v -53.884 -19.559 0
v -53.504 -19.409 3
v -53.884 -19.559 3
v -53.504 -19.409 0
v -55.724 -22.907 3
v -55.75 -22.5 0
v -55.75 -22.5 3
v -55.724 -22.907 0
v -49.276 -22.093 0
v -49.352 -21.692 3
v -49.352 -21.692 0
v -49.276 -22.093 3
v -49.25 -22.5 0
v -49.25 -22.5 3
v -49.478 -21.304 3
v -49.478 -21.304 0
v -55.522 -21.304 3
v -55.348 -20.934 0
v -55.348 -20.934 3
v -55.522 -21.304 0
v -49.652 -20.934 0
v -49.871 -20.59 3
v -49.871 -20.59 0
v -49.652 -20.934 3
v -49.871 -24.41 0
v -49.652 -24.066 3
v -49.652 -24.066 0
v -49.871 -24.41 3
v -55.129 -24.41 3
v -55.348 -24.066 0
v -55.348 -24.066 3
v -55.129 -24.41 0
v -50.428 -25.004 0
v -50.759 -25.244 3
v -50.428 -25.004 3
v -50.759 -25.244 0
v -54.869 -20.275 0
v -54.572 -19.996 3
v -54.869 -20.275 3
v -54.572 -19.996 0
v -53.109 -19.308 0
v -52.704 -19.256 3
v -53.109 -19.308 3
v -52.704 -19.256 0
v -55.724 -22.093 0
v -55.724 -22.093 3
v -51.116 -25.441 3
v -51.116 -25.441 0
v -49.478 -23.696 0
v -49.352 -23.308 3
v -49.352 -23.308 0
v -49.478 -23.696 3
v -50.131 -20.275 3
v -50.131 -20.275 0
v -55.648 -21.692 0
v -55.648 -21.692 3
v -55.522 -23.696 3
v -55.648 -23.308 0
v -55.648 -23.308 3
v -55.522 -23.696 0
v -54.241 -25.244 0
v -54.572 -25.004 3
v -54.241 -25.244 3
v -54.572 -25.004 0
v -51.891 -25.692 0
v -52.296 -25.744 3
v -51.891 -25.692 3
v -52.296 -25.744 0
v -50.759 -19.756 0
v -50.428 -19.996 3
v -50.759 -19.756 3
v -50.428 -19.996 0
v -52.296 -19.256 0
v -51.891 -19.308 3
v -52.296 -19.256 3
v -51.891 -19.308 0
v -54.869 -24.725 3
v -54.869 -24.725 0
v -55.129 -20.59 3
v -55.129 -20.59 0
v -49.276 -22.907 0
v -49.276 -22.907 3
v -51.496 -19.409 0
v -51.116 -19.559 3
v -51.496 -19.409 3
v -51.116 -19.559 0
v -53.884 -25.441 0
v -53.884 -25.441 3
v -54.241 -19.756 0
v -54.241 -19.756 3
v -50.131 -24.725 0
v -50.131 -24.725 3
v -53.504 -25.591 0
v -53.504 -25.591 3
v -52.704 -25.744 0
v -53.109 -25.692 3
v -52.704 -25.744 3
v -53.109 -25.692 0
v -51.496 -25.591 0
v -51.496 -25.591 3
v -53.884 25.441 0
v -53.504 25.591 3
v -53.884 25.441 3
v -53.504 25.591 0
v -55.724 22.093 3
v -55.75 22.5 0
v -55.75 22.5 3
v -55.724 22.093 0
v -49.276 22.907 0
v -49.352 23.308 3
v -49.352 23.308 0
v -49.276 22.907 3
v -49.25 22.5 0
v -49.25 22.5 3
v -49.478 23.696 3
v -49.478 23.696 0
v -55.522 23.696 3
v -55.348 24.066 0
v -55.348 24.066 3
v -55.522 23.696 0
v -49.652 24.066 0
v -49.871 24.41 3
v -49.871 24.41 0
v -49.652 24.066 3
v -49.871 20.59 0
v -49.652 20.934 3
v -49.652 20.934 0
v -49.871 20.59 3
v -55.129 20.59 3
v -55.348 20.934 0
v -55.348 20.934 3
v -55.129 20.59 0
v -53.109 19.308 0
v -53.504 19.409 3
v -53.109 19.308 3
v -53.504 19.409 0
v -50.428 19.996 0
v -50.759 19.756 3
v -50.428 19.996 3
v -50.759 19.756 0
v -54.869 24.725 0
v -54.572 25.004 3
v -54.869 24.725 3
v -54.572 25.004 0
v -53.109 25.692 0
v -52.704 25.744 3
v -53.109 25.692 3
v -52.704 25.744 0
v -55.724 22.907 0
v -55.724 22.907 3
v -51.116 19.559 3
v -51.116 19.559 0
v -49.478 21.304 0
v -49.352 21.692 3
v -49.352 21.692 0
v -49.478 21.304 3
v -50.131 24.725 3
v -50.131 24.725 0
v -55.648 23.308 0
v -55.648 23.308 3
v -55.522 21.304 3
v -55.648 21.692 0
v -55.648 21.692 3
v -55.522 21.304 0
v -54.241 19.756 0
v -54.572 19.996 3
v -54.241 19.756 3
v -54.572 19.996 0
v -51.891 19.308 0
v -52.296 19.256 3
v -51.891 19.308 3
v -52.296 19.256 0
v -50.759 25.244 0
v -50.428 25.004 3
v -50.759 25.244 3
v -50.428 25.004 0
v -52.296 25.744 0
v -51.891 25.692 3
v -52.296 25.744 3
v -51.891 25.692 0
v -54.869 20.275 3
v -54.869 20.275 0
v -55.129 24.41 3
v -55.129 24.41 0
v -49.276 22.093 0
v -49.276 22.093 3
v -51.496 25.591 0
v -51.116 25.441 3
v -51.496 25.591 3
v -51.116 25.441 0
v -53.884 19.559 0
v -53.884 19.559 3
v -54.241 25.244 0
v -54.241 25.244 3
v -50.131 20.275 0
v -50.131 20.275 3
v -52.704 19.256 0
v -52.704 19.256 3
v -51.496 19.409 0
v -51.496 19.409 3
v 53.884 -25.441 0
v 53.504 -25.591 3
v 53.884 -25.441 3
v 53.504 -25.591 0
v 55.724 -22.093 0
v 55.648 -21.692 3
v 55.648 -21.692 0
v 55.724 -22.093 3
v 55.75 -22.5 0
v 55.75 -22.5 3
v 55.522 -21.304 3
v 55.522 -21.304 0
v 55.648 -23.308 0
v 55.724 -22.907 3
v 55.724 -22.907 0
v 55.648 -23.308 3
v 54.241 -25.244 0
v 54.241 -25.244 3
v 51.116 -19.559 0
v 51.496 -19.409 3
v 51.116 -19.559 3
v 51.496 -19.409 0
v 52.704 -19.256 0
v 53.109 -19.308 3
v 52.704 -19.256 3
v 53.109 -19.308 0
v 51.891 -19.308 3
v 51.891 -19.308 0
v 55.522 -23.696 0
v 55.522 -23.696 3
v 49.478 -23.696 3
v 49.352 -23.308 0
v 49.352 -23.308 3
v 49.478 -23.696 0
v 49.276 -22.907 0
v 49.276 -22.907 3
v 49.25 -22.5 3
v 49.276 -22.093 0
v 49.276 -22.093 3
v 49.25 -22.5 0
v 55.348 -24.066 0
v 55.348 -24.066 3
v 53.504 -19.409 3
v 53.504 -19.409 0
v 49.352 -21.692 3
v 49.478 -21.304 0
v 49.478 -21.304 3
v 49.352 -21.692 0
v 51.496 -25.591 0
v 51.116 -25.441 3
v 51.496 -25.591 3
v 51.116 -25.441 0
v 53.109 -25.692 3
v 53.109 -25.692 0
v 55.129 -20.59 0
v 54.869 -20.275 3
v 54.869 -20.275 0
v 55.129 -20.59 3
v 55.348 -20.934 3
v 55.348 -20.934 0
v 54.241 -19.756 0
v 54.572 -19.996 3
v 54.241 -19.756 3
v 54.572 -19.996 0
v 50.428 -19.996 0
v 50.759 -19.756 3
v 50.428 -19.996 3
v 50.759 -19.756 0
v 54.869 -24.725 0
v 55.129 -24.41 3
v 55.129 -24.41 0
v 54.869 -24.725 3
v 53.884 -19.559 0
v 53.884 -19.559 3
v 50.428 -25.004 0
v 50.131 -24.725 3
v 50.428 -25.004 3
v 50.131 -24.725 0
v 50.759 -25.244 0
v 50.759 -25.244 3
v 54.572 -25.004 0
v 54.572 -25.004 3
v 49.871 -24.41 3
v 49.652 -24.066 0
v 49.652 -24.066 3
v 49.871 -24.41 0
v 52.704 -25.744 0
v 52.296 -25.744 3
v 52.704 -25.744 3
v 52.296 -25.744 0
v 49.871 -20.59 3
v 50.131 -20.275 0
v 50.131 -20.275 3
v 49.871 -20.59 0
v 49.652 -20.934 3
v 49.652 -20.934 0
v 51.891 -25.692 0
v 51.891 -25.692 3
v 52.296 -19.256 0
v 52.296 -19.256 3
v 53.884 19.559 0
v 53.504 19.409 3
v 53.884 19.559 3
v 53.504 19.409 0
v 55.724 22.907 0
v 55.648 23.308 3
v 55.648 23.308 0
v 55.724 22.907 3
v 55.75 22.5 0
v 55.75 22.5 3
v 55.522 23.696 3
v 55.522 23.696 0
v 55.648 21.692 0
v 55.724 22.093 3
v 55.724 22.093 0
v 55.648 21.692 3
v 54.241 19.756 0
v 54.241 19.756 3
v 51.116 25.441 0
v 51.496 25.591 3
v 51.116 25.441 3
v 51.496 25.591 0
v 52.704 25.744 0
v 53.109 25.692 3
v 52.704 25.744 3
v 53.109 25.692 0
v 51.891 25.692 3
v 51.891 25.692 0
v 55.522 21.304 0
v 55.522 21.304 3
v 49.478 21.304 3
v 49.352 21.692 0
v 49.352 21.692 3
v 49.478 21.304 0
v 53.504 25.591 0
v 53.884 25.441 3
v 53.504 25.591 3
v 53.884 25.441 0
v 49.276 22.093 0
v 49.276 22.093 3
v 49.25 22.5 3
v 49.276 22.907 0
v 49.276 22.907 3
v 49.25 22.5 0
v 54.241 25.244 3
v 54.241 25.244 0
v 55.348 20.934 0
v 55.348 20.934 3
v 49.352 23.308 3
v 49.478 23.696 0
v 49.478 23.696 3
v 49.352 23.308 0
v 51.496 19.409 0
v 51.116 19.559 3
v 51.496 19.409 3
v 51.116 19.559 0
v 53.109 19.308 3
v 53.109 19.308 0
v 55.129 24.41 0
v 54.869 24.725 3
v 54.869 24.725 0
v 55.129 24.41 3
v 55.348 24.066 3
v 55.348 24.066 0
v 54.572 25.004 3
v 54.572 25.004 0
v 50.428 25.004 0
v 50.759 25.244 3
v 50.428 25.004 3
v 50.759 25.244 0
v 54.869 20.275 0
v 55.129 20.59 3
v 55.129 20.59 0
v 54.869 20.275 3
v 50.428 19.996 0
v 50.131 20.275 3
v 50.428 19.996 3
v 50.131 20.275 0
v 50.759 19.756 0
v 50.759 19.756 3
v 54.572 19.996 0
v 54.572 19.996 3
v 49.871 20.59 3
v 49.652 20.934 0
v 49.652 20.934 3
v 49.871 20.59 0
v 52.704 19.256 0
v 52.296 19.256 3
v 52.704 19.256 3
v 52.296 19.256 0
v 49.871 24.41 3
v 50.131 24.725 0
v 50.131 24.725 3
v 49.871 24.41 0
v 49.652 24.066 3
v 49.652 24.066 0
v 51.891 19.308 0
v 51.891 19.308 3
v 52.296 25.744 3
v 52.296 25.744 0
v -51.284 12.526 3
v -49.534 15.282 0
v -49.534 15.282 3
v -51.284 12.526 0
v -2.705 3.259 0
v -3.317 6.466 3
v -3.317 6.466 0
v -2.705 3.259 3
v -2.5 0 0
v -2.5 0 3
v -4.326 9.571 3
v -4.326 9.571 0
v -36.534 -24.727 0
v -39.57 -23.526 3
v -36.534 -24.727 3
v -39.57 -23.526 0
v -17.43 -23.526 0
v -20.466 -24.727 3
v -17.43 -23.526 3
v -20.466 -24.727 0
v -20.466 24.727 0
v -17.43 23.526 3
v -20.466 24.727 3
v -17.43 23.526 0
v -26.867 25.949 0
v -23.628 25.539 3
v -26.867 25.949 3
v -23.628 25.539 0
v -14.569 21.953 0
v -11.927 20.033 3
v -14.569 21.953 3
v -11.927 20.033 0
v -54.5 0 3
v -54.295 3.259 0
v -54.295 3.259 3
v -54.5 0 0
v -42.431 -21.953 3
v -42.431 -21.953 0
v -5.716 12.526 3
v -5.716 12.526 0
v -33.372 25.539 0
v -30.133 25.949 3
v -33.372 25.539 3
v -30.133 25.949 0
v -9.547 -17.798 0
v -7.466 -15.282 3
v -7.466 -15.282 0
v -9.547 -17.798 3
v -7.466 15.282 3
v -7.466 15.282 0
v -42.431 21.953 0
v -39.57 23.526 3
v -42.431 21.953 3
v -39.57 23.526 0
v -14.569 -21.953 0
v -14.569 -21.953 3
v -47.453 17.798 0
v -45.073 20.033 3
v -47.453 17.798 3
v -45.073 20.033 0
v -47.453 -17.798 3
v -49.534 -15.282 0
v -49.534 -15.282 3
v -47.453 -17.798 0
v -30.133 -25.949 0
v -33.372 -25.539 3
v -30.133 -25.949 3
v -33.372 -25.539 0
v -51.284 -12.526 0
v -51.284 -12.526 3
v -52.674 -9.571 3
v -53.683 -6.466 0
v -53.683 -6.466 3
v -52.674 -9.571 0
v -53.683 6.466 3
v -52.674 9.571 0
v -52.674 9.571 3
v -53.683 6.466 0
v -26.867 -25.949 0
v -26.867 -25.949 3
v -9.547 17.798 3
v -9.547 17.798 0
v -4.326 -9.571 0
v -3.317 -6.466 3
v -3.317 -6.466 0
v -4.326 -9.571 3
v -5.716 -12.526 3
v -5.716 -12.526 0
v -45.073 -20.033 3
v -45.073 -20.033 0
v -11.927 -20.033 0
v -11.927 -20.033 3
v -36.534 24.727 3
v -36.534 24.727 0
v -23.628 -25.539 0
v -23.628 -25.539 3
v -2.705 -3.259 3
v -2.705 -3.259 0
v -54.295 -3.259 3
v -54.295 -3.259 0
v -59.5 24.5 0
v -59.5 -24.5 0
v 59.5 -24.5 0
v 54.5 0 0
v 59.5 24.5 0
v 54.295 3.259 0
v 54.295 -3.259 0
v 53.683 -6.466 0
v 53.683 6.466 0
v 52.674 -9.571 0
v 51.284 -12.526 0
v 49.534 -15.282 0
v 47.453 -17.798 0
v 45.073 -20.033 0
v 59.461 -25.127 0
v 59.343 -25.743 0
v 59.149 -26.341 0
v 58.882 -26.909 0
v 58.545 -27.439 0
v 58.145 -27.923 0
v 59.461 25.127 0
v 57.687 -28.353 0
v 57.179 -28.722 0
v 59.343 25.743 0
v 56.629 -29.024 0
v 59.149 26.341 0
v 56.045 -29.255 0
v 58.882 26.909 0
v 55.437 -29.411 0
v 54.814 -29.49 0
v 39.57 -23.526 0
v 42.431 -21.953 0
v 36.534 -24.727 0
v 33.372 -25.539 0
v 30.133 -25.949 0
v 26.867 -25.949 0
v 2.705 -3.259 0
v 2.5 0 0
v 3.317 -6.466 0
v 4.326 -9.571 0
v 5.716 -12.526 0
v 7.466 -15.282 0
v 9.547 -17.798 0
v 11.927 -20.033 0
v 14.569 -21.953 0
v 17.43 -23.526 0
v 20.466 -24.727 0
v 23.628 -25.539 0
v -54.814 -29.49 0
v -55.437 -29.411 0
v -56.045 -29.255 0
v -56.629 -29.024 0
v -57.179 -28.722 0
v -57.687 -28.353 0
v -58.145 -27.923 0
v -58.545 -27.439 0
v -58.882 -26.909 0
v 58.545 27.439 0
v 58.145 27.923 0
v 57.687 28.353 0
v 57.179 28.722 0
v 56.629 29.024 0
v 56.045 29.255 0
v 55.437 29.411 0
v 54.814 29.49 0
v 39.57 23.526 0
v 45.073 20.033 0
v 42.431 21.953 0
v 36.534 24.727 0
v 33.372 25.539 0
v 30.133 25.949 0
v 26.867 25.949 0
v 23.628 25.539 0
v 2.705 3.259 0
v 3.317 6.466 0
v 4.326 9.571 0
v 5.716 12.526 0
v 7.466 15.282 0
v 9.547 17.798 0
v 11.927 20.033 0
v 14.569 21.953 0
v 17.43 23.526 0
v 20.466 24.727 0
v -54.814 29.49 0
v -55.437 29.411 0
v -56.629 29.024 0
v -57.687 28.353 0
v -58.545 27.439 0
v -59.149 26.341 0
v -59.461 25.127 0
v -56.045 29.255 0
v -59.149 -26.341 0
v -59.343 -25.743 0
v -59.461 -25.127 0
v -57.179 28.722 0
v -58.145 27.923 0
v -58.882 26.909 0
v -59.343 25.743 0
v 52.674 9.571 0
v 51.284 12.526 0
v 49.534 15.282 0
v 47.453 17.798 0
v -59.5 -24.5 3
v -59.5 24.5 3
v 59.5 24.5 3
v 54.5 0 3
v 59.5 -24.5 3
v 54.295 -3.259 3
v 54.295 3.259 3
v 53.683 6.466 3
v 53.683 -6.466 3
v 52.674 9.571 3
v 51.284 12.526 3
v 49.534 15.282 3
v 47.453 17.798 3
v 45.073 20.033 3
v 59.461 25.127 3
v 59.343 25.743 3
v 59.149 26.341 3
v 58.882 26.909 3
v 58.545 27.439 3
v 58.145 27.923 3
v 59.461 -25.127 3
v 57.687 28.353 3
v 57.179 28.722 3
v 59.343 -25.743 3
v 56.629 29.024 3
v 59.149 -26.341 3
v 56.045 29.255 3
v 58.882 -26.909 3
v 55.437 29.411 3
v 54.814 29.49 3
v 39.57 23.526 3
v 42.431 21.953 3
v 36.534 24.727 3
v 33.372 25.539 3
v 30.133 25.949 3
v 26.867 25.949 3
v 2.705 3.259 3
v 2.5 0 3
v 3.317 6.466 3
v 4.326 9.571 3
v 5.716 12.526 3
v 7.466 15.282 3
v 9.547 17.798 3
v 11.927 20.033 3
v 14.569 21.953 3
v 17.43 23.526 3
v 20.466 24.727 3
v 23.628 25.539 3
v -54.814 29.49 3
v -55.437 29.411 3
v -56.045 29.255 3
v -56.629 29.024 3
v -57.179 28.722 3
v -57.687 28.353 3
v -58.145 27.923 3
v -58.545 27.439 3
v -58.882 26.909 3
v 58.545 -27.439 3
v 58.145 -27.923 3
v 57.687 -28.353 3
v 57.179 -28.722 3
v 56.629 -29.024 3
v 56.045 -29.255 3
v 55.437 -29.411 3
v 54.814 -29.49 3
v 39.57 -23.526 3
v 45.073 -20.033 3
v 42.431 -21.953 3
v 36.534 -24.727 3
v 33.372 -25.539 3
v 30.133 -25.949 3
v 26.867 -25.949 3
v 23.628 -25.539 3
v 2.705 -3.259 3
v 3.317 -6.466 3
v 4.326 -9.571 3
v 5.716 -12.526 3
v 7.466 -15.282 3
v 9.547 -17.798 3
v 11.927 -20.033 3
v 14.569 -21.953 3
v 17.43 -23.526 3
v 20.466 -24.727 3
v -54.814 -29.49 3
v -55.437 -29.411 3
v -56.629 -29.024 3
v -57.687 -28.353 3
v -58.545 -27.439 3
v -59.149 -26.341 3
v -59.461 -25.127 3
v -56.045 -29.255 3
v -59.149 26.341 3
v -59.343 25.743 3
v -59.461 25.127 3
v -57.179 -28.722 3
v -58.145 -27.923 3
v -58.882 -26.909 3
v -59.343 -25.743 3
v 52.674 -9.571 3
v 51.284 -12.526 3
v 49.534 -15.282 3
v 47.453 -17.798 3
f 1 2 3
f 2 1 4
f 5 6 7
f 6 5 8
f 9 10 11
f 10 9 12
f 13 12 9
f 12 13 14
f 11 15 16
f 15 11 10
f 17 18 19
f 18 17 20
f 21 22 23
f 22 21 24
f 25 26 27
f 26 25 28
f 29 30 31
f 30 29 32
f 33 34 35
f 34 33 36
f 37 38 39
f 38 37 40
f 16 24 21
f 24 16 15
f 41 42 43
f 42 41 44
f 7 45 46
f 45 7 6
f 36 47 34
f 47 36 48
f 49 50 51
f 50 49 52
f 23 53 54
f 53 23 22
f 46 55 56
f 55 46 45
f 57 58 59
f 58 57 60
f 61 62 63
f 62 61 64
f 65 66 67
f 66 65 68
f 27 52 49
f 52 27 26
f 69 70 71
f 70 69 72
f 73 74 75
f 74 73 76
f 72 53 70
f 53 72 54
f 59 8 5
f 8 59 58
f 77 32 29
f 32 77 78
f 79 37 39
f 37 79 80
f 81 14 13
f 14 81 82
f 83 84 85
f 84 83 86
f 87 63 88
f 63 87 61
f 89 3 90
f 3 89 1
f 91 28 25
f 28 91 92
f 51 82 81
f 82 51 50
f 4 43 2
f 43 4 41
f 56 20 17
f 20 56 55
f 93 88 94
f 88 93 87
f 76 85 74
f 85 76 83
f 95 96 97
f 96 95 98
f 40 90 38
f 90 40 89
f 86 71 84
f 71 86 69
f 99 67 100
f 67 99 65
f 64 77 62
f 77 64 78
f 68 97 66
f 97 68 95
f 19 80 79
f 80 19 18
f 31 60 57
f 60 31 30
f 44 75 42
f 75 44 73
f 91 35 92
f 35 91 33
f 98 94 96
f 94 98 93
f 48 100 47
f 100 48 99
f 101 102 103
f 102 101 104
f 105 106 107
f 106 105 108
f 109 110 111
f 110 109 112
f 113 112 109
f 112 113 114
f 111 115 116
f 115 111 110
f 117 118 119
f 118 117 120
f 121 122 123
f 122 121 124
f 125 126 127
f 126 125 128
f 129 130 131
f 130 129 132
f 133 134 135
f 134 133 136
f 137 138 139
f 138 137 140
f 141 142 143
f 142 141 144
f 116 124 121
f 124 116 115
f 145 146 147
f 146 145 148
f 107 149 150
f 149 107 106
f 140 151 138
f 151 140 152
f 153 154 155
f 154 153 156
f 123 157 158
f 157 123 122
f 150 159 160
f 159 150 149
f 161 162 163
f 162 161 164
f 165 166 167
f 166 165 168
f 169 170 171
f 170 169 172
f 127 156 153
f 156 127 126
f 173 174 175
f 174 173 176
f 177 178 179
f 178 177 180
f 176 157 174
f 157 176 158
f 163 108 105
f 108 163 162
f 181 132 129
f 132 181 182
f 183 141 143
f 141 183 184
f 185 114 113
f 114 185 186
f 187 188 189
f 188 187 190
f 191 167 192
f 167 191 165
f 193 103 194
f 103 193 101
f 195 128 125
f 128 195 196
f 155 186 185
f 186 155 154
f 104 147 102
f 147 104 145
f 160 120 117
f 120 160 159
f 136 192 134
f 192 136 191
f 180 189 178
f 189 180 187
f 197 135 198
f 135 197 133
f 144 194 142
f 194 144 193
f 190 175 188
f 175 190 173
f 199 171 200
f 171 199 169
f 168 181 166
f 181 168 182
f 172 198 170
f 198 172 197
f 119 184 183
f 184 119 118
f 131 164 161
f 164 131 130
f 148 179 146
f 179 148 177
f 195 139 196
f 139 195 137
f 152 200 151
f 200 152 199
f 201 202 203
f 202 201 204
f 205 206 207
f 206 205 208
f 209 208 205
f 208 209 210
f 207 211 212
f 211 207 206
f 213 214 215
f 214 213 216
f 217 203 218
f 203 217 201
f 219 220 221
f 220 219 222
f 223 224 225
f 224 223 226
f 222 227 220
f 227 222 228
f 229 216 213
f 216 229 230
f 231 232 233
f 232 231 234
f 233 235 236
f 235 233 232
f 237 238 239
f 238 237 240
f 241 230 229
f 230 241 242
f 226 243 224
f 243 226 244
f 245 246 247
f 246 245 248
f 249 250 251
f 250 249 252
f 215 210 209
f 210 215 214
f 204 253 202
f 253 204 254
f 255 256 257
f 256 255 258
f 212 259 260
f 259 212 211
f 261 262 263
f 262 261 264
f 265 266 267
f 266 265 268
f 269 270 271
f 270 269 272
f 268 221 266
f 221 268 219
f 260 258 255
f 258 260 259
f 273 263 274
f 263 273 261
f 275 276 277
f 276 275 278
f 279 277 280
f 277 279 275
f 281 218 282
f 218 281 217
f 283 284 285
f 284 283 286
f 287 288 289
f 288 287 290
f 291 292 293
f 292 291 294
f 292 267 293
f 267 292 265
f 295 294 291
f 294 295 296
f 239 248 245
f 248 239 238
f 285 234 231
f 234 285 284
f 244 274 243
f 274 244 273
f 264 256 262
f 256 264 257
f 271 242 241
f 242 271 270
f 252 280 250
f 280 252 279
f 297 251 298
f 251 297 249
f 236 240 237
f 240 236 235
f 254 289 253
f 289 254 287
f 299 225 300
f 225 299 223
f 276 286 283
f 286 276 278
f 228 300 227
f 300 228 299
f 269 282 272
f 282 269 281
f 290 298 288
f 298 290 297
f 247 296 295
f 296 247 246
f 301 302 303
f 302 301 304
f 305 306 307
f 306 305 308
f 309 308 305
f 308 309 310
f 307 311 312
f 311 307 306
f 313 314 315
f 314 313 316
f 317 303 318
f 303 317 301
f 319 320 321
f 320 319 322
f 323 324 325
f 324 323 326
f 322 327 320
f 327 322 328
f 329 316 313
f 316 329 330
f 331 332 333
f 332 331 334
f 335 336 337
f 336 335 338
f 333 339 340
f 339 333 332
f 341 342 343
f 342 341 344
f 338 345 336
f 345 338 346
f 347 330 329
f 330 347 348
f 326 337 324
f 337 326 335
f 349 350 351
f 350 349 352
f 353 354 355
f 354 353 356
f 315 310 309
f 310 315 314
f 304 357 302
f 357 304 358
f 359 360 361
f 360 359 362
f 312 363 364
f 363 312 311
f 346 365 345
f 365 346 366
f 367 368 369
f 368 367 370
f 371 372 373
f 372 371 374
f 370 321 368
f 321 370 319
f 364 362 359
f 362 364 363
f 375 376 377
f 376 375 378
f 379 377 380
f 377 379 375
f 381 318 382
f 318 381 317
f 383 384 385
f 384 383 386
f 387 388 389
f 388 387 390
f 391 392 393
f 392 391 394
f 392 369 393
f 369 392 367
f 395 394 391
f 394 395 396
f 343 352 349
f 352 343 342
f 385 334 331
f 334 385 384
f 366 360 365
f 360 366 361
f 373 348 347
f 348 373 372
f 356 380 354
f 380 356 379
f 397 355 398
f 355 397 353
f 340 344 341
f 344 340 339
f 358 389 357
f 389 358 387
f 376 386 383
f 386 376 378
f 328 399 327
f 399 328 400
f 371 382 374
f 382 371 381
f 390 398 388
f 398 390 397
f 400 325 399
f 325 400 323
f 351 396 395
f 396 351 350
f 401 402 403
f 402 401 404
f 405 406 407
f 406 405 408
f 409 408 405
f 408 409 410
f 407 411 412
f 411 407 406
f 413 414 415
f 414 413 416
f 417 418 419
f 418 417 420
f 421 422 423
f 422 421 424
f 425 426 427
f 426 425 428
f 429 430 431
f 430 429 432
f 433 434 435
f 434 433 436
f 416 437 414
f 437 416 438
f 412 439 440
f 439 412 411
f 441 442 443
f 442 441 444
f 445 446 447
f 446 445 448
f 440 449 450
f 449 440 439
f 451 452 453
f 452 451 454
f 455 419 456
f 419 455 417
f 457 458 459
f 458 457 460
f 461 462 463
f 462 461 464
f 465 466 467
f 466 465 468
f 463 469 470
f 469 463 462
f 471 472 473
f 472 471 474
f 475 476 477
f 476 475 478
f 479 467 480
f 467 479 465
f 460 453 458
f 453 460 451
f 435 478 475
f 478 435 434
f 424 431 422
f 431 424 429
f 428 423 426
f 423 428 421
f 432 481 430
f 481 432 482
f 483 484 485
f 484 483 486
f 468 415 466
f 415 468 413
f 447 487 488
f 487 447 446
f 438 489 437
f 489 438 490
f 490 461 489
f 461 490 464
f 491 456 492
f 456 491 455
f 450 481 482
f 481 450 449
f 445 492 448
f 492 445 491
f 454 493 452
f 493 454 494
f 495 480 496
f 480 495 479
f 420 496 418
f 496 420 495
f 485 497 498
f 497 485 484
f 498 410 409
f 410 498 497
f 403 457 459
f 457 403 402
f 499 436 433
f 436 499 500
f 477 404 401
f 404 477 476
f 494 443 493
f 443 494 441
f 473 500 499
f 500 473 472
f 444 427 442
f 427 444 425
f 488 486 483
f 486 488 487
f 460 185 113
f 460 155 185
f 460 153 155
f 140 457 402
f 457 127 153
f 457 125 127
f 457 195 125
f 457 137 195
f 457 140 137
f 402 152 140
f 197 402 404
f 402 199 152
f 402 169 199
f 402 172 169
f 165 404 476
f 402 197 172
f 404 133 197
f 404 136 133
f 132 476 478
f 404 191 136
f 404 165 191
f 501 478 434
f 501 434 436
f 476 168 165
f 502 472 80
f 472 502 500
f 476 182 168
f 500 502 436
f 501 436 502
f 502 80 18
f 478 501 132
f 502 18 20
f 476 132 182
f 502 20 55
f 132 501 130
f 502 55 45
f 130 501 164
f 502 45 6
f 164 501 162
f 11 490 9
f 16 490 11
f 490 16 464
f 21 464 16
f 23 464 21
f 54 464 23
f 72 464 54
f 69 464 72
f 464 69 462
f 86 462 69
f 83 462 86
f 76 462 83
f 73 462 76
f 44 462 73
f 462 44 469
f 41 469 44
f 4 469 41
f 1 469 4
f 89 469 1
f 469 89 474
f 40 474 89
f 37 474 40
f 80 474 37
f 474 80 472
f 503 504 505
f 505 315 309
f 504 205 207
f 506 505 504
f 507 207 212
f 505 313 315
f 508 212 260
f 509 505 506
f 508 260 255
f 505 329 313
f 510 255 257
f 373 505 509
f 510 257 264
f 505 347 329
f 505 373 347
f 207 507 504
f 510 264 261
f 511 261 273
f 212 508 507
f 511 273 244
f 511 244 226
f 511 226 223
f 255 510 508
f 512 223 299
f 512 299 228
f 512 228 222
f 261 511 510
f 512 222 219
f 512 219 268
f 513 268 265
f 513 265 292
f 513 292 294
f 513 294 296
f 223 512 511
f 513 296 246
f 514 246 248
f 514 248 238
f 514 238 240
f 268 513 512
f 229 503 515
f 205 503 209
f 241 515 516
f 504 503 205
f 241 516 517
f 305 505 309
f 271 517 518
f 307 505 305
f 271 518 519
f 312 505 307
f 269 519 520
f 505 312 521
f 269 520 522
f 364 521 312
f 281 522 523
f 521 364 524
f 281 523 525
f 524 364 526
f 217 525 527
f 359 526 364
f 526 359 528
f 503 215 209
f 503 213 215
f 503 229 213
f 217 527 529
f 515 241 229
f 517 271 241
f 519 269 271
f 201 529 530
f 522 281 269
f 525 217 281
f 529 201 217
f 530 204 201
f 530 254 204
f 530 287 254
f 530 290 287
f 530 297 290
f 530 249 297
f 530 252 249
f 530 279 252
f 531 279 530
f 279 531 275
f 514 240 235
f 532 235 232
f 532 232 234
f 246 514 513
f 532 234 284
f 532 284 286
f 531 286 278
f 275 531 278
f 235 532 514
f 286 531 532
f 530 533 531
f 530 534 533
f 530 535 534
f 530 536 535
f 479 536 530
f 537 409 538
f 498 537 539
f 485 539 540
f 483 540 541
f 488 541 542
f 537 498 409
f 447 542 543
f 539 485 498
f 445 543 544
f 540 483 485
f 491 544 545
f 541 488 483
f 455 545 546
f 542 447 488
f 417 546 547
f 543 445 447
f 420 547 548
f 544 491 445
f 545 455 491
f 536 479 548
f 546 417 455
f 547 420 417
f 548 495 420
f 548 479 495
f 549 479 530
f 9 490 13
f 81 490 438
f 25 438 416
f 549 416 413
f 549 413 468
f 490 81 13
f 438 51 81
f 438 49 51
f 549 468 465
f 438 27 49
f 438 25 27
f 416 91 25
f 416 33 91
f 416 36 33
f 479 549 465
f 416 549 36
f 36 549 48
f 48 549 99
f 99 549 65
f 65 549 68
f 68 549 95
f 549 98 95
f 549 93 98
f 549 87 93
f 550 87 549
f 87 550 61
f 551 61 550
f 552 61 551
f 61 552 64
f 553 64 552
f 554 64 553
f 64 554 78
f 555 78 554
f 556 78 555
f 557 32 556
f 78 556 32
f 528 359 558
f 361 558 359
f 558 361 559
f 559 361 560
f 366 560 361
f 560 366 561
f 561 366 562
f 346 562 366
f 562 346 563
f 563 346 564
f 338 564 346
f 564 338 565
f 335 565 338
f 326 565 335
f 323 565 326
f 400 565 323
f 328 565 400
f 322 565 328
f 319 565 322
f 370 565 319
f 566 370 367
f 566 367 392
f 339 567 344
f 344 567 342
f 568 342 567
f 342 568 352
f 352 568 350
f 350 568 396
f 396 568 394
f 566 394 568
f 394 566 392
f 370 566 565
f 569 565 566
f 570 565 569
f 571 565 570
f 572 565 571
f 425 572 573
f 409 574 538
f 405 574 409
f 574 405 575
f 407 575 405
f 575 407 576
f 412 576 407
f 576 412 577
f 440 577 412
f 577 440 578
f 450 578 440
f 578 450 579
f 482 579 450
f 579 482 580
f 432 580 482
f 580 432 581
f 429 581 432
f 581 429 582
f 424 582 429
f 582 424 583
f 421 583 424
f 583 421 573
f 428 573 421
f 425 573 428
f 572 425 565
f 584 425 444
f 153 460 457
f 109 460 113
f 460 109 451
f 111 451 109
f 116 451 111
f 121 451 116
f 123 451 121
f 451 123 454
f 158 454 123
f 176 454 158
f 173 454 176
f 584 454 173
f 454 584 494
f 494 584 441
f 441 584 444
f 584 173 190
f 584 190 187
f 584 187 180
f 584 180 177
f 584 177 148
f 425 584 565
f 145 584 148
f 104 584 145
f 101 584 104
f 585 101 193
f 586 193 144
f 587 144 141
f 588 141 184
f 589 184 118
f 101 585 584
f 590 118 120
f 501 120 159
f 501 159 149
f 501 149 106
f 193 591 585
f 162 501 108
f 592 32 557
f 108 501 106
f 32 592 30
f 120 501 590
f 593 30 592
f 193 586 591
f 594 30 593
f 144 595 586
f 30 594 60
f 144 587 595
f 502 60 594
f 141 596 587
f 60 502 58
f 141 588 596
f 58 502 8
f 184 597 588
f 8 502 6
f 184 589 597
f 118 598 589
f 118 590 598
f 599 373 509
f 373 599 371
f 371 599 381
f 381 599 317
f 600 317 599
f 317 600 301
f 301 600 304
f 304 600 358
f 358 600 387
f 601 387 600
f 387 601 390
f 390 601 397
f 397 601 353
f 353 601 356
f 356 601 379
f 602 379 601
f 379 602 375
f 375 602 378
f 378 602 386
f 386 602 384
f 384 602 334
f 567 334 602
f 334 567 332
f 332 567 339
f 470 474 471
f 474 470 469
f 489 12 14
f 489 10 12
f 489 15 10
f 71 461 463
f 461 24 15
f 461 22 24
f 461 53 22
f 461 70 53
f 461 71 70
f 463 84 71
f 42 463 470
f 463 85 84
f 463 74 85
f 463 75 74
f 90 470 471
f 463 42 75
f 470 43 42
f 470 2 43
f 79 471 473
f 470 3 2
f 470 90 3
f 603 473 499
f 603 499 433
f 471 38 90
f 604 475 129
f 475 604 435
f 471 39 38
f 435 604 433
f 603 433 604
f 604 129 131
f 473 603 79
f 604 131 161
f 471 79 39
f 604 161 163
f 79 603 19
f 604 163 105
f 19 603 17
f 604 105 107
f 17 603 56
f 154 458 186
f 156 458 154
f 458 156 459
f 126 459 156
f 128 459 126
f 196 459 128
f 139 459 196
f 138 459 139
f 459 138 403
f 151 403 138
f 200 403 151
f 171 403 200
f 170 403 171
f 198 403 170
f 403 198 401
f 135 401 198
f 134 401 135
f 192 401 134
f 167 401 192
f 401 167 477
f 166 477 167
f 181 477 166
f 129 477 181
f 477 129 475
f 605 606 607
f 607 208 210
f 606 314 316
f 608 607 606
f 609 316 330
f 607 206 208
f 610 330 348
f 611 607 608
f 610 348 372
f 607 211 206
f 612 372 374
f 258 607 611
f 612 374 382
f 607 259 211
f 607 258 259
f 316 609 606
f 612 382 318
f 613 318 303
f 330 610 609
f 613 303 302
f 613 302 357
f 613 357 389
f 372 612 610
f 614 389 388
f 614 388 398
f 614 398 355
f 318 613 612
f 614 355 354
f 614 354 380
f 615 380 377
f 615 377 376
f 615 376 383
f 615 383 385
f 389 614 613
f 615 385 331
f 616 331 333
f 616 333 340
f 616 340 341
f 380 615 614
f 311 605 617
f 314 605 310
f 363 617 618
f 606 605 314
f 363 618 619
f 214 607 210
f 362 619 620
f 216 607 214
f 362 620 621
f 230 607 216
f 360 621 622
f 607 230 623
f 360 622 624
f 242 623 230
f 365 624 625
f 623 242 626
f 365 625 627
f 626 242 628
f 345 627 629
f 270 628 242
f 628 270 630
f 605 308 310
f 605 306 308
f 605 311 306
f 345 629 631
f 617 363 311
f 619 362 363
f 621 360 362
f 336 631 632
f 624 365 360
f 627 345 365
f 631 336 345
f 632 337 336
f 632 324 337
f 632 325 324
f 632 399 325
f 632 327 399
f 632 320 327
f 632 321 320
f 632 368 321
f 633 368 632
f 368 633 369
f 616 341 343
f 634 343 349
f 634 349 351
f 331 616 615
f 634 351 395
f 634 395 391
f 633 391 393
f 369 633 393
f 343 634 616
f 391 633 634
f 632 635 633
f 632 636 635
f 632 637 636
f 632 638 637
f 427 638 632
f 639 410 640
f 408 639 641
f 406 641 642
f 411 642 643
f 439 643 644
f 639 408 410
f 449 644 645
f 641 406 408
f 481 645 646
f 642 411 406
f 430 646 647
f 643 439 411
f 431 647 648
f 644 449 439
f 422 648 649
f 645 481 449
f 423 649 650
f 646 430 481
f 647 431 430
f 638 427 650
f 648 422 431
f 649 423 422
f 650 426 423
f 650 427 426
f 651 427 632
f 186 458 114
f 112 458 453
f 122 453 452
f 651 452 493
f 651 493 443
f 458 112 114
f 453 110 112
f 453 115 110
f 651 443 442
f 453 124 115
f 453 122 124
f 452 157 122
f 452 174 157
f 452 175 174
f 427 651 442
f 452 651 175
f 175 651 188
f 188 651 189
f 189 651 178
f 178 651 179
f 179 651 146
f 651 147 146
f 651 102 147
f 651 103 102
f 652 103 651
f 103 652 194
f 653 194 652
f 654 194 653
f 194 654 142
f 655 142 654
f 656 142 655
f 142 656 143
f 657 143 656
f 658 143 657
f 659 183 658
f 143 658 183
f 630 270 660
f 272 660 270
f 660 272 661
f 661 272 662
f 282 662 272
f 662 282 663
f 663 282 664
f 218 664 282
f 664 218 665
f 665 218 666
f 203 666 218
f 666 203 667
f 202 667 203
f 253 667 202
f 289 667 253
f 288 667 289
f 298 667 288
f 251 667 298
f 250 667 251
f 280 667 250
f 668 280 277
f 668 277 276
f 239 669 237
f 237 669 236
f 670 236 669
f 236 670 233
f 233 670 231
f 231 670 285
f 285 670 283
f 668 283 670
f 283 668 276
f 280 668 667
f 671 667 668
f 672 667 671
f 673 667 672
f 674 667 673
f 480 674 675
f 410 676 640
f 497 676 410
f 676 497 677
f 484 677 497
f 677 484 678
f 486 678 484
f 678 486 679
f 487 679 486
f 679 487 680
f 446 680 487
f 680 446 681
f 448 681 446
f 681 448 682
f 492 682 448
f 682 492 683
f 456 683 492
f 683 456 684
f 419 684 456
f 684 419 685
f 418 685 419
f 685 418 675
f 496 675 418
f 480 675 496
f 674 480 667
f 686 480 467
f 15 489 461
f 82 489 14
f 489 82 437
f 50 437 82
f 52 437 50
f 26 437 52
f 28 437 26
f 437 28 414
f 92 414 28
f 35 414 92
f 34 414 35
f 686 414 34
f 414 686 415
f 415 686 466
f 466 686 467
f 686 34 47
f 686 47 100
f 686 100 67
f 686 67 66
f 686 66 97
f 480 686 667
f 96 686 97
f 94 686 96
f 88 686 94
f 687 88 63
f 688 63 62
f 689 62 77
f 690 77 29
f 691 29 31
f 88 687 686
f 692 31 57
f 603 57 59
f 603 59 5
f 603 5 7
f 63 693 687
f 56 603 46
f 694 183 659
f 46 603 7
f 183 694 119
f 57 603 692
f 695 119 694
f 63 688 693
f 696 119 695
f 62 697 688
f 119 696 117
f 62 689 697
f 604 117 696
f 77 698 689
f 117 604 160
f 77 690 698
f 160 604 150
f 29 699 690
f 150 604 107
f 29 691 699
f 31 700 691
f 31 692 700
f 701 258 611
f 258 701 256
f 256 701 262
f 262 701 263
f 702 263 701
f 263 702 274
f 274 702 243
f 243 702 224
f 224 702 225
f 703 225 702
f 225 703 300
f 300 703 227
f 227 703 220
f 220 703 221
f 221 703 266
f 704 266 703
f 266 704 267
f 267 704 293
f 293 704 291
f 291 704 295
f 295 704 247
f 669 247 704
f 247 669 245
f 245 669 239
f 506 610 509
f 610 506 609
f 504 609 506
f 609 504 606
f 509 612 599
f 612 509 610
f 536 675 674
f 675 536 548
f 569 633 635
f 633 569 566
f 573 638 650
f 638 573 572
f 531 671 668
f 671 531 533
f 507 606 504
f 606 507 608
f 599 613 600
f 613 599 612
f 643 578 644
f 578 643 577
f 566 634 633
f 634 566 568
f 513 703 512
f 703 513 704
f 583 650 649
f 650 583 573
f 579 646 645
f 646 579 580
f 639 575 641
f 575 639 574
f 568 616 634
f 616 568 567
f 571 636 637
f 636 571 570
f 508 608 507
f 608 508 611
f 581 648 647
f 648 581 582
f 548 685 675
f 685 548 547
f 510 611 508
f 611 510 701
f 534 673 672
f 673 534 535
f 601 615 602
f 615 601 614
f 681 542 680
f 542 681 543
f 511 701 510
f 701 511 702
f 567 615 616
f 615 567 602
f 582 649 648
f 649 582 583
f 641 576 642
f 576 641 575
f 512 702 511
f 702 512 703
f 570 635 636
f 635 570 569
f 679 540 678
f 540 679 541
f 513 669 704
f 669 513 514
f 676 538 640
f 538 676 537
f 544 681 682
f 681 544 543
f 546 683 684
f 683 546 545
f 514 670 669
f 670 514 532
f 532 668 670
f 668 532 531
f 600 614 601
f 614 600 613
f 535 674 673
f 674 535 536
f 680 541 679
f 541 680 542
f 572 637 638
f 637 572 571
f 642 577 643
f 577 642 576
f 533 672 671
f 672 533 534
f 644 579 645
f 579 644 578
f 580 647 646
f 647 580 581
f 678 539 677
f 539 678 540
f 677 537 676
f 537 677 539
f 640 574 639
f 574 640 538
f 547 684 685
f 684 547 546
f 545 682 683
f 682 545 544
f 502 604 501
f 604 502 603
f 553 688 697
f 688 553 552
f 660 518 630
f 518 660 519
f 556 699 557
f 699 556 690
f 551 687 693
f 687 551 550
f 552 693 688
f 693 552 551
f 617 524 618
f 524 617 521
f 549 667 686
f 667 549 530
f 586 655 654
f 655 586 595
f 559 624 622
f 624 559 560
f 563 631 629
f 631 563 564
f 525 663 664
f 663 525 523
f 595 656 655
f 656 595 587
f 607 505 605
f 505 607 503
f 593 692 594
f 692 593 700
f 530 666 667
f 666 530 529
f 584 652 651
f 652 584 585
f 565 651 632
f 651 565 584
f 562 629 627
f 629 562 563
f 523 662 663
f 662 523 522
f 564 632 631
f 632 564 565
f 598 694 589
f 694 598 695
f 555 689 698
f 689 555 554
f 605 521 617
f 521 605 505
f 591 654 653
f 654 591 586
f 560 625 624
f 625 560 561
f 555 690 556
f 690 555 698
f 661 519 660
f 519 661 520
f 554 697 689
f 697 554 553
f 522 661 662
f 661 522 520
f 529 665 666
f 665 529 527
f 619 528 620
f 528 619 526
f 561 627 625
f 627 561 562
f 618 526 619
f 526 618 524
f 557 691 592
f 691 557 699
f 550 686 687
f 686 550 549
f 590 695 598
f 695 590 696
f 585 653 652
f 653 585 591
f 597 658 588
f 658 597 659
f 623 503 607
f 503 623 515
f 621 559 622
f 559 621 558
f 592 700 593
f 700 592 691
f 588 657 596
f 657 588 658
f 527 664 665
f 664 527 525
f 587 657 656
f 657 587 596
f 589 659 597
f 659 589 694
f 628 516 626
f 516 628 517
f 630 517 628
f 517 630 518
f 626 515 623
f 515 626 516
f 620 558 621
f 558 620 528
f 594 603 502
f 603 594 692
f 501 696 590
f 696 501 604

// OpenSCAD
$fn = 50;


difference() {
	union() {
		hull() {
			translate(v = [-54.5000000000, 24.5000000000, 0]) {
				cylinder(h = 3, r = 5);
			}
			translate(v = [54.5000000000, 24.5000000000, 0]) {
				cylinder(h = 3, r = 5);
			}
			translate(v = [-54.5000000000, -24.5000000000, 0]) {
				cylinder(h = 3, r = 5);
			}
			translate(v = [54.5000000000, -24.5000000000, 0]) {
				cylinder(h = 3, r = 5);
			}
		}
	}
	union() {
		#translate(v = [-52.5000000000, -22.5000000000, -100.0000000000]) {
			cylinder(h = 200, r = 3.2500000000);
		}
		#translate(v = [-52.5000000000, 22.5000000000, -100.0000000000]) {
			cylinder(h = 200, r = 3.2500000000);
		}
		#translate(v = [52.5000000000, -22.5000000000, -100.0000000000]) {
			cylinder(h = 200, r = 3.2500000000);
		}
		#translate(v = [52.5000000000, 22.5000000000, -100.0000000000]) {
			cylinder(h = 200, r = 3.2500000000);
		}
		#translate(v = [-28.5000000000, 0, 0]) {
			cylinder(h = 3, r = 26.0000000000);
		}
		#translate(v = [28.5000000000, 0, 0]) {
			cylinder(h = 3, r = 26.0000000000);
		}
	}
}
